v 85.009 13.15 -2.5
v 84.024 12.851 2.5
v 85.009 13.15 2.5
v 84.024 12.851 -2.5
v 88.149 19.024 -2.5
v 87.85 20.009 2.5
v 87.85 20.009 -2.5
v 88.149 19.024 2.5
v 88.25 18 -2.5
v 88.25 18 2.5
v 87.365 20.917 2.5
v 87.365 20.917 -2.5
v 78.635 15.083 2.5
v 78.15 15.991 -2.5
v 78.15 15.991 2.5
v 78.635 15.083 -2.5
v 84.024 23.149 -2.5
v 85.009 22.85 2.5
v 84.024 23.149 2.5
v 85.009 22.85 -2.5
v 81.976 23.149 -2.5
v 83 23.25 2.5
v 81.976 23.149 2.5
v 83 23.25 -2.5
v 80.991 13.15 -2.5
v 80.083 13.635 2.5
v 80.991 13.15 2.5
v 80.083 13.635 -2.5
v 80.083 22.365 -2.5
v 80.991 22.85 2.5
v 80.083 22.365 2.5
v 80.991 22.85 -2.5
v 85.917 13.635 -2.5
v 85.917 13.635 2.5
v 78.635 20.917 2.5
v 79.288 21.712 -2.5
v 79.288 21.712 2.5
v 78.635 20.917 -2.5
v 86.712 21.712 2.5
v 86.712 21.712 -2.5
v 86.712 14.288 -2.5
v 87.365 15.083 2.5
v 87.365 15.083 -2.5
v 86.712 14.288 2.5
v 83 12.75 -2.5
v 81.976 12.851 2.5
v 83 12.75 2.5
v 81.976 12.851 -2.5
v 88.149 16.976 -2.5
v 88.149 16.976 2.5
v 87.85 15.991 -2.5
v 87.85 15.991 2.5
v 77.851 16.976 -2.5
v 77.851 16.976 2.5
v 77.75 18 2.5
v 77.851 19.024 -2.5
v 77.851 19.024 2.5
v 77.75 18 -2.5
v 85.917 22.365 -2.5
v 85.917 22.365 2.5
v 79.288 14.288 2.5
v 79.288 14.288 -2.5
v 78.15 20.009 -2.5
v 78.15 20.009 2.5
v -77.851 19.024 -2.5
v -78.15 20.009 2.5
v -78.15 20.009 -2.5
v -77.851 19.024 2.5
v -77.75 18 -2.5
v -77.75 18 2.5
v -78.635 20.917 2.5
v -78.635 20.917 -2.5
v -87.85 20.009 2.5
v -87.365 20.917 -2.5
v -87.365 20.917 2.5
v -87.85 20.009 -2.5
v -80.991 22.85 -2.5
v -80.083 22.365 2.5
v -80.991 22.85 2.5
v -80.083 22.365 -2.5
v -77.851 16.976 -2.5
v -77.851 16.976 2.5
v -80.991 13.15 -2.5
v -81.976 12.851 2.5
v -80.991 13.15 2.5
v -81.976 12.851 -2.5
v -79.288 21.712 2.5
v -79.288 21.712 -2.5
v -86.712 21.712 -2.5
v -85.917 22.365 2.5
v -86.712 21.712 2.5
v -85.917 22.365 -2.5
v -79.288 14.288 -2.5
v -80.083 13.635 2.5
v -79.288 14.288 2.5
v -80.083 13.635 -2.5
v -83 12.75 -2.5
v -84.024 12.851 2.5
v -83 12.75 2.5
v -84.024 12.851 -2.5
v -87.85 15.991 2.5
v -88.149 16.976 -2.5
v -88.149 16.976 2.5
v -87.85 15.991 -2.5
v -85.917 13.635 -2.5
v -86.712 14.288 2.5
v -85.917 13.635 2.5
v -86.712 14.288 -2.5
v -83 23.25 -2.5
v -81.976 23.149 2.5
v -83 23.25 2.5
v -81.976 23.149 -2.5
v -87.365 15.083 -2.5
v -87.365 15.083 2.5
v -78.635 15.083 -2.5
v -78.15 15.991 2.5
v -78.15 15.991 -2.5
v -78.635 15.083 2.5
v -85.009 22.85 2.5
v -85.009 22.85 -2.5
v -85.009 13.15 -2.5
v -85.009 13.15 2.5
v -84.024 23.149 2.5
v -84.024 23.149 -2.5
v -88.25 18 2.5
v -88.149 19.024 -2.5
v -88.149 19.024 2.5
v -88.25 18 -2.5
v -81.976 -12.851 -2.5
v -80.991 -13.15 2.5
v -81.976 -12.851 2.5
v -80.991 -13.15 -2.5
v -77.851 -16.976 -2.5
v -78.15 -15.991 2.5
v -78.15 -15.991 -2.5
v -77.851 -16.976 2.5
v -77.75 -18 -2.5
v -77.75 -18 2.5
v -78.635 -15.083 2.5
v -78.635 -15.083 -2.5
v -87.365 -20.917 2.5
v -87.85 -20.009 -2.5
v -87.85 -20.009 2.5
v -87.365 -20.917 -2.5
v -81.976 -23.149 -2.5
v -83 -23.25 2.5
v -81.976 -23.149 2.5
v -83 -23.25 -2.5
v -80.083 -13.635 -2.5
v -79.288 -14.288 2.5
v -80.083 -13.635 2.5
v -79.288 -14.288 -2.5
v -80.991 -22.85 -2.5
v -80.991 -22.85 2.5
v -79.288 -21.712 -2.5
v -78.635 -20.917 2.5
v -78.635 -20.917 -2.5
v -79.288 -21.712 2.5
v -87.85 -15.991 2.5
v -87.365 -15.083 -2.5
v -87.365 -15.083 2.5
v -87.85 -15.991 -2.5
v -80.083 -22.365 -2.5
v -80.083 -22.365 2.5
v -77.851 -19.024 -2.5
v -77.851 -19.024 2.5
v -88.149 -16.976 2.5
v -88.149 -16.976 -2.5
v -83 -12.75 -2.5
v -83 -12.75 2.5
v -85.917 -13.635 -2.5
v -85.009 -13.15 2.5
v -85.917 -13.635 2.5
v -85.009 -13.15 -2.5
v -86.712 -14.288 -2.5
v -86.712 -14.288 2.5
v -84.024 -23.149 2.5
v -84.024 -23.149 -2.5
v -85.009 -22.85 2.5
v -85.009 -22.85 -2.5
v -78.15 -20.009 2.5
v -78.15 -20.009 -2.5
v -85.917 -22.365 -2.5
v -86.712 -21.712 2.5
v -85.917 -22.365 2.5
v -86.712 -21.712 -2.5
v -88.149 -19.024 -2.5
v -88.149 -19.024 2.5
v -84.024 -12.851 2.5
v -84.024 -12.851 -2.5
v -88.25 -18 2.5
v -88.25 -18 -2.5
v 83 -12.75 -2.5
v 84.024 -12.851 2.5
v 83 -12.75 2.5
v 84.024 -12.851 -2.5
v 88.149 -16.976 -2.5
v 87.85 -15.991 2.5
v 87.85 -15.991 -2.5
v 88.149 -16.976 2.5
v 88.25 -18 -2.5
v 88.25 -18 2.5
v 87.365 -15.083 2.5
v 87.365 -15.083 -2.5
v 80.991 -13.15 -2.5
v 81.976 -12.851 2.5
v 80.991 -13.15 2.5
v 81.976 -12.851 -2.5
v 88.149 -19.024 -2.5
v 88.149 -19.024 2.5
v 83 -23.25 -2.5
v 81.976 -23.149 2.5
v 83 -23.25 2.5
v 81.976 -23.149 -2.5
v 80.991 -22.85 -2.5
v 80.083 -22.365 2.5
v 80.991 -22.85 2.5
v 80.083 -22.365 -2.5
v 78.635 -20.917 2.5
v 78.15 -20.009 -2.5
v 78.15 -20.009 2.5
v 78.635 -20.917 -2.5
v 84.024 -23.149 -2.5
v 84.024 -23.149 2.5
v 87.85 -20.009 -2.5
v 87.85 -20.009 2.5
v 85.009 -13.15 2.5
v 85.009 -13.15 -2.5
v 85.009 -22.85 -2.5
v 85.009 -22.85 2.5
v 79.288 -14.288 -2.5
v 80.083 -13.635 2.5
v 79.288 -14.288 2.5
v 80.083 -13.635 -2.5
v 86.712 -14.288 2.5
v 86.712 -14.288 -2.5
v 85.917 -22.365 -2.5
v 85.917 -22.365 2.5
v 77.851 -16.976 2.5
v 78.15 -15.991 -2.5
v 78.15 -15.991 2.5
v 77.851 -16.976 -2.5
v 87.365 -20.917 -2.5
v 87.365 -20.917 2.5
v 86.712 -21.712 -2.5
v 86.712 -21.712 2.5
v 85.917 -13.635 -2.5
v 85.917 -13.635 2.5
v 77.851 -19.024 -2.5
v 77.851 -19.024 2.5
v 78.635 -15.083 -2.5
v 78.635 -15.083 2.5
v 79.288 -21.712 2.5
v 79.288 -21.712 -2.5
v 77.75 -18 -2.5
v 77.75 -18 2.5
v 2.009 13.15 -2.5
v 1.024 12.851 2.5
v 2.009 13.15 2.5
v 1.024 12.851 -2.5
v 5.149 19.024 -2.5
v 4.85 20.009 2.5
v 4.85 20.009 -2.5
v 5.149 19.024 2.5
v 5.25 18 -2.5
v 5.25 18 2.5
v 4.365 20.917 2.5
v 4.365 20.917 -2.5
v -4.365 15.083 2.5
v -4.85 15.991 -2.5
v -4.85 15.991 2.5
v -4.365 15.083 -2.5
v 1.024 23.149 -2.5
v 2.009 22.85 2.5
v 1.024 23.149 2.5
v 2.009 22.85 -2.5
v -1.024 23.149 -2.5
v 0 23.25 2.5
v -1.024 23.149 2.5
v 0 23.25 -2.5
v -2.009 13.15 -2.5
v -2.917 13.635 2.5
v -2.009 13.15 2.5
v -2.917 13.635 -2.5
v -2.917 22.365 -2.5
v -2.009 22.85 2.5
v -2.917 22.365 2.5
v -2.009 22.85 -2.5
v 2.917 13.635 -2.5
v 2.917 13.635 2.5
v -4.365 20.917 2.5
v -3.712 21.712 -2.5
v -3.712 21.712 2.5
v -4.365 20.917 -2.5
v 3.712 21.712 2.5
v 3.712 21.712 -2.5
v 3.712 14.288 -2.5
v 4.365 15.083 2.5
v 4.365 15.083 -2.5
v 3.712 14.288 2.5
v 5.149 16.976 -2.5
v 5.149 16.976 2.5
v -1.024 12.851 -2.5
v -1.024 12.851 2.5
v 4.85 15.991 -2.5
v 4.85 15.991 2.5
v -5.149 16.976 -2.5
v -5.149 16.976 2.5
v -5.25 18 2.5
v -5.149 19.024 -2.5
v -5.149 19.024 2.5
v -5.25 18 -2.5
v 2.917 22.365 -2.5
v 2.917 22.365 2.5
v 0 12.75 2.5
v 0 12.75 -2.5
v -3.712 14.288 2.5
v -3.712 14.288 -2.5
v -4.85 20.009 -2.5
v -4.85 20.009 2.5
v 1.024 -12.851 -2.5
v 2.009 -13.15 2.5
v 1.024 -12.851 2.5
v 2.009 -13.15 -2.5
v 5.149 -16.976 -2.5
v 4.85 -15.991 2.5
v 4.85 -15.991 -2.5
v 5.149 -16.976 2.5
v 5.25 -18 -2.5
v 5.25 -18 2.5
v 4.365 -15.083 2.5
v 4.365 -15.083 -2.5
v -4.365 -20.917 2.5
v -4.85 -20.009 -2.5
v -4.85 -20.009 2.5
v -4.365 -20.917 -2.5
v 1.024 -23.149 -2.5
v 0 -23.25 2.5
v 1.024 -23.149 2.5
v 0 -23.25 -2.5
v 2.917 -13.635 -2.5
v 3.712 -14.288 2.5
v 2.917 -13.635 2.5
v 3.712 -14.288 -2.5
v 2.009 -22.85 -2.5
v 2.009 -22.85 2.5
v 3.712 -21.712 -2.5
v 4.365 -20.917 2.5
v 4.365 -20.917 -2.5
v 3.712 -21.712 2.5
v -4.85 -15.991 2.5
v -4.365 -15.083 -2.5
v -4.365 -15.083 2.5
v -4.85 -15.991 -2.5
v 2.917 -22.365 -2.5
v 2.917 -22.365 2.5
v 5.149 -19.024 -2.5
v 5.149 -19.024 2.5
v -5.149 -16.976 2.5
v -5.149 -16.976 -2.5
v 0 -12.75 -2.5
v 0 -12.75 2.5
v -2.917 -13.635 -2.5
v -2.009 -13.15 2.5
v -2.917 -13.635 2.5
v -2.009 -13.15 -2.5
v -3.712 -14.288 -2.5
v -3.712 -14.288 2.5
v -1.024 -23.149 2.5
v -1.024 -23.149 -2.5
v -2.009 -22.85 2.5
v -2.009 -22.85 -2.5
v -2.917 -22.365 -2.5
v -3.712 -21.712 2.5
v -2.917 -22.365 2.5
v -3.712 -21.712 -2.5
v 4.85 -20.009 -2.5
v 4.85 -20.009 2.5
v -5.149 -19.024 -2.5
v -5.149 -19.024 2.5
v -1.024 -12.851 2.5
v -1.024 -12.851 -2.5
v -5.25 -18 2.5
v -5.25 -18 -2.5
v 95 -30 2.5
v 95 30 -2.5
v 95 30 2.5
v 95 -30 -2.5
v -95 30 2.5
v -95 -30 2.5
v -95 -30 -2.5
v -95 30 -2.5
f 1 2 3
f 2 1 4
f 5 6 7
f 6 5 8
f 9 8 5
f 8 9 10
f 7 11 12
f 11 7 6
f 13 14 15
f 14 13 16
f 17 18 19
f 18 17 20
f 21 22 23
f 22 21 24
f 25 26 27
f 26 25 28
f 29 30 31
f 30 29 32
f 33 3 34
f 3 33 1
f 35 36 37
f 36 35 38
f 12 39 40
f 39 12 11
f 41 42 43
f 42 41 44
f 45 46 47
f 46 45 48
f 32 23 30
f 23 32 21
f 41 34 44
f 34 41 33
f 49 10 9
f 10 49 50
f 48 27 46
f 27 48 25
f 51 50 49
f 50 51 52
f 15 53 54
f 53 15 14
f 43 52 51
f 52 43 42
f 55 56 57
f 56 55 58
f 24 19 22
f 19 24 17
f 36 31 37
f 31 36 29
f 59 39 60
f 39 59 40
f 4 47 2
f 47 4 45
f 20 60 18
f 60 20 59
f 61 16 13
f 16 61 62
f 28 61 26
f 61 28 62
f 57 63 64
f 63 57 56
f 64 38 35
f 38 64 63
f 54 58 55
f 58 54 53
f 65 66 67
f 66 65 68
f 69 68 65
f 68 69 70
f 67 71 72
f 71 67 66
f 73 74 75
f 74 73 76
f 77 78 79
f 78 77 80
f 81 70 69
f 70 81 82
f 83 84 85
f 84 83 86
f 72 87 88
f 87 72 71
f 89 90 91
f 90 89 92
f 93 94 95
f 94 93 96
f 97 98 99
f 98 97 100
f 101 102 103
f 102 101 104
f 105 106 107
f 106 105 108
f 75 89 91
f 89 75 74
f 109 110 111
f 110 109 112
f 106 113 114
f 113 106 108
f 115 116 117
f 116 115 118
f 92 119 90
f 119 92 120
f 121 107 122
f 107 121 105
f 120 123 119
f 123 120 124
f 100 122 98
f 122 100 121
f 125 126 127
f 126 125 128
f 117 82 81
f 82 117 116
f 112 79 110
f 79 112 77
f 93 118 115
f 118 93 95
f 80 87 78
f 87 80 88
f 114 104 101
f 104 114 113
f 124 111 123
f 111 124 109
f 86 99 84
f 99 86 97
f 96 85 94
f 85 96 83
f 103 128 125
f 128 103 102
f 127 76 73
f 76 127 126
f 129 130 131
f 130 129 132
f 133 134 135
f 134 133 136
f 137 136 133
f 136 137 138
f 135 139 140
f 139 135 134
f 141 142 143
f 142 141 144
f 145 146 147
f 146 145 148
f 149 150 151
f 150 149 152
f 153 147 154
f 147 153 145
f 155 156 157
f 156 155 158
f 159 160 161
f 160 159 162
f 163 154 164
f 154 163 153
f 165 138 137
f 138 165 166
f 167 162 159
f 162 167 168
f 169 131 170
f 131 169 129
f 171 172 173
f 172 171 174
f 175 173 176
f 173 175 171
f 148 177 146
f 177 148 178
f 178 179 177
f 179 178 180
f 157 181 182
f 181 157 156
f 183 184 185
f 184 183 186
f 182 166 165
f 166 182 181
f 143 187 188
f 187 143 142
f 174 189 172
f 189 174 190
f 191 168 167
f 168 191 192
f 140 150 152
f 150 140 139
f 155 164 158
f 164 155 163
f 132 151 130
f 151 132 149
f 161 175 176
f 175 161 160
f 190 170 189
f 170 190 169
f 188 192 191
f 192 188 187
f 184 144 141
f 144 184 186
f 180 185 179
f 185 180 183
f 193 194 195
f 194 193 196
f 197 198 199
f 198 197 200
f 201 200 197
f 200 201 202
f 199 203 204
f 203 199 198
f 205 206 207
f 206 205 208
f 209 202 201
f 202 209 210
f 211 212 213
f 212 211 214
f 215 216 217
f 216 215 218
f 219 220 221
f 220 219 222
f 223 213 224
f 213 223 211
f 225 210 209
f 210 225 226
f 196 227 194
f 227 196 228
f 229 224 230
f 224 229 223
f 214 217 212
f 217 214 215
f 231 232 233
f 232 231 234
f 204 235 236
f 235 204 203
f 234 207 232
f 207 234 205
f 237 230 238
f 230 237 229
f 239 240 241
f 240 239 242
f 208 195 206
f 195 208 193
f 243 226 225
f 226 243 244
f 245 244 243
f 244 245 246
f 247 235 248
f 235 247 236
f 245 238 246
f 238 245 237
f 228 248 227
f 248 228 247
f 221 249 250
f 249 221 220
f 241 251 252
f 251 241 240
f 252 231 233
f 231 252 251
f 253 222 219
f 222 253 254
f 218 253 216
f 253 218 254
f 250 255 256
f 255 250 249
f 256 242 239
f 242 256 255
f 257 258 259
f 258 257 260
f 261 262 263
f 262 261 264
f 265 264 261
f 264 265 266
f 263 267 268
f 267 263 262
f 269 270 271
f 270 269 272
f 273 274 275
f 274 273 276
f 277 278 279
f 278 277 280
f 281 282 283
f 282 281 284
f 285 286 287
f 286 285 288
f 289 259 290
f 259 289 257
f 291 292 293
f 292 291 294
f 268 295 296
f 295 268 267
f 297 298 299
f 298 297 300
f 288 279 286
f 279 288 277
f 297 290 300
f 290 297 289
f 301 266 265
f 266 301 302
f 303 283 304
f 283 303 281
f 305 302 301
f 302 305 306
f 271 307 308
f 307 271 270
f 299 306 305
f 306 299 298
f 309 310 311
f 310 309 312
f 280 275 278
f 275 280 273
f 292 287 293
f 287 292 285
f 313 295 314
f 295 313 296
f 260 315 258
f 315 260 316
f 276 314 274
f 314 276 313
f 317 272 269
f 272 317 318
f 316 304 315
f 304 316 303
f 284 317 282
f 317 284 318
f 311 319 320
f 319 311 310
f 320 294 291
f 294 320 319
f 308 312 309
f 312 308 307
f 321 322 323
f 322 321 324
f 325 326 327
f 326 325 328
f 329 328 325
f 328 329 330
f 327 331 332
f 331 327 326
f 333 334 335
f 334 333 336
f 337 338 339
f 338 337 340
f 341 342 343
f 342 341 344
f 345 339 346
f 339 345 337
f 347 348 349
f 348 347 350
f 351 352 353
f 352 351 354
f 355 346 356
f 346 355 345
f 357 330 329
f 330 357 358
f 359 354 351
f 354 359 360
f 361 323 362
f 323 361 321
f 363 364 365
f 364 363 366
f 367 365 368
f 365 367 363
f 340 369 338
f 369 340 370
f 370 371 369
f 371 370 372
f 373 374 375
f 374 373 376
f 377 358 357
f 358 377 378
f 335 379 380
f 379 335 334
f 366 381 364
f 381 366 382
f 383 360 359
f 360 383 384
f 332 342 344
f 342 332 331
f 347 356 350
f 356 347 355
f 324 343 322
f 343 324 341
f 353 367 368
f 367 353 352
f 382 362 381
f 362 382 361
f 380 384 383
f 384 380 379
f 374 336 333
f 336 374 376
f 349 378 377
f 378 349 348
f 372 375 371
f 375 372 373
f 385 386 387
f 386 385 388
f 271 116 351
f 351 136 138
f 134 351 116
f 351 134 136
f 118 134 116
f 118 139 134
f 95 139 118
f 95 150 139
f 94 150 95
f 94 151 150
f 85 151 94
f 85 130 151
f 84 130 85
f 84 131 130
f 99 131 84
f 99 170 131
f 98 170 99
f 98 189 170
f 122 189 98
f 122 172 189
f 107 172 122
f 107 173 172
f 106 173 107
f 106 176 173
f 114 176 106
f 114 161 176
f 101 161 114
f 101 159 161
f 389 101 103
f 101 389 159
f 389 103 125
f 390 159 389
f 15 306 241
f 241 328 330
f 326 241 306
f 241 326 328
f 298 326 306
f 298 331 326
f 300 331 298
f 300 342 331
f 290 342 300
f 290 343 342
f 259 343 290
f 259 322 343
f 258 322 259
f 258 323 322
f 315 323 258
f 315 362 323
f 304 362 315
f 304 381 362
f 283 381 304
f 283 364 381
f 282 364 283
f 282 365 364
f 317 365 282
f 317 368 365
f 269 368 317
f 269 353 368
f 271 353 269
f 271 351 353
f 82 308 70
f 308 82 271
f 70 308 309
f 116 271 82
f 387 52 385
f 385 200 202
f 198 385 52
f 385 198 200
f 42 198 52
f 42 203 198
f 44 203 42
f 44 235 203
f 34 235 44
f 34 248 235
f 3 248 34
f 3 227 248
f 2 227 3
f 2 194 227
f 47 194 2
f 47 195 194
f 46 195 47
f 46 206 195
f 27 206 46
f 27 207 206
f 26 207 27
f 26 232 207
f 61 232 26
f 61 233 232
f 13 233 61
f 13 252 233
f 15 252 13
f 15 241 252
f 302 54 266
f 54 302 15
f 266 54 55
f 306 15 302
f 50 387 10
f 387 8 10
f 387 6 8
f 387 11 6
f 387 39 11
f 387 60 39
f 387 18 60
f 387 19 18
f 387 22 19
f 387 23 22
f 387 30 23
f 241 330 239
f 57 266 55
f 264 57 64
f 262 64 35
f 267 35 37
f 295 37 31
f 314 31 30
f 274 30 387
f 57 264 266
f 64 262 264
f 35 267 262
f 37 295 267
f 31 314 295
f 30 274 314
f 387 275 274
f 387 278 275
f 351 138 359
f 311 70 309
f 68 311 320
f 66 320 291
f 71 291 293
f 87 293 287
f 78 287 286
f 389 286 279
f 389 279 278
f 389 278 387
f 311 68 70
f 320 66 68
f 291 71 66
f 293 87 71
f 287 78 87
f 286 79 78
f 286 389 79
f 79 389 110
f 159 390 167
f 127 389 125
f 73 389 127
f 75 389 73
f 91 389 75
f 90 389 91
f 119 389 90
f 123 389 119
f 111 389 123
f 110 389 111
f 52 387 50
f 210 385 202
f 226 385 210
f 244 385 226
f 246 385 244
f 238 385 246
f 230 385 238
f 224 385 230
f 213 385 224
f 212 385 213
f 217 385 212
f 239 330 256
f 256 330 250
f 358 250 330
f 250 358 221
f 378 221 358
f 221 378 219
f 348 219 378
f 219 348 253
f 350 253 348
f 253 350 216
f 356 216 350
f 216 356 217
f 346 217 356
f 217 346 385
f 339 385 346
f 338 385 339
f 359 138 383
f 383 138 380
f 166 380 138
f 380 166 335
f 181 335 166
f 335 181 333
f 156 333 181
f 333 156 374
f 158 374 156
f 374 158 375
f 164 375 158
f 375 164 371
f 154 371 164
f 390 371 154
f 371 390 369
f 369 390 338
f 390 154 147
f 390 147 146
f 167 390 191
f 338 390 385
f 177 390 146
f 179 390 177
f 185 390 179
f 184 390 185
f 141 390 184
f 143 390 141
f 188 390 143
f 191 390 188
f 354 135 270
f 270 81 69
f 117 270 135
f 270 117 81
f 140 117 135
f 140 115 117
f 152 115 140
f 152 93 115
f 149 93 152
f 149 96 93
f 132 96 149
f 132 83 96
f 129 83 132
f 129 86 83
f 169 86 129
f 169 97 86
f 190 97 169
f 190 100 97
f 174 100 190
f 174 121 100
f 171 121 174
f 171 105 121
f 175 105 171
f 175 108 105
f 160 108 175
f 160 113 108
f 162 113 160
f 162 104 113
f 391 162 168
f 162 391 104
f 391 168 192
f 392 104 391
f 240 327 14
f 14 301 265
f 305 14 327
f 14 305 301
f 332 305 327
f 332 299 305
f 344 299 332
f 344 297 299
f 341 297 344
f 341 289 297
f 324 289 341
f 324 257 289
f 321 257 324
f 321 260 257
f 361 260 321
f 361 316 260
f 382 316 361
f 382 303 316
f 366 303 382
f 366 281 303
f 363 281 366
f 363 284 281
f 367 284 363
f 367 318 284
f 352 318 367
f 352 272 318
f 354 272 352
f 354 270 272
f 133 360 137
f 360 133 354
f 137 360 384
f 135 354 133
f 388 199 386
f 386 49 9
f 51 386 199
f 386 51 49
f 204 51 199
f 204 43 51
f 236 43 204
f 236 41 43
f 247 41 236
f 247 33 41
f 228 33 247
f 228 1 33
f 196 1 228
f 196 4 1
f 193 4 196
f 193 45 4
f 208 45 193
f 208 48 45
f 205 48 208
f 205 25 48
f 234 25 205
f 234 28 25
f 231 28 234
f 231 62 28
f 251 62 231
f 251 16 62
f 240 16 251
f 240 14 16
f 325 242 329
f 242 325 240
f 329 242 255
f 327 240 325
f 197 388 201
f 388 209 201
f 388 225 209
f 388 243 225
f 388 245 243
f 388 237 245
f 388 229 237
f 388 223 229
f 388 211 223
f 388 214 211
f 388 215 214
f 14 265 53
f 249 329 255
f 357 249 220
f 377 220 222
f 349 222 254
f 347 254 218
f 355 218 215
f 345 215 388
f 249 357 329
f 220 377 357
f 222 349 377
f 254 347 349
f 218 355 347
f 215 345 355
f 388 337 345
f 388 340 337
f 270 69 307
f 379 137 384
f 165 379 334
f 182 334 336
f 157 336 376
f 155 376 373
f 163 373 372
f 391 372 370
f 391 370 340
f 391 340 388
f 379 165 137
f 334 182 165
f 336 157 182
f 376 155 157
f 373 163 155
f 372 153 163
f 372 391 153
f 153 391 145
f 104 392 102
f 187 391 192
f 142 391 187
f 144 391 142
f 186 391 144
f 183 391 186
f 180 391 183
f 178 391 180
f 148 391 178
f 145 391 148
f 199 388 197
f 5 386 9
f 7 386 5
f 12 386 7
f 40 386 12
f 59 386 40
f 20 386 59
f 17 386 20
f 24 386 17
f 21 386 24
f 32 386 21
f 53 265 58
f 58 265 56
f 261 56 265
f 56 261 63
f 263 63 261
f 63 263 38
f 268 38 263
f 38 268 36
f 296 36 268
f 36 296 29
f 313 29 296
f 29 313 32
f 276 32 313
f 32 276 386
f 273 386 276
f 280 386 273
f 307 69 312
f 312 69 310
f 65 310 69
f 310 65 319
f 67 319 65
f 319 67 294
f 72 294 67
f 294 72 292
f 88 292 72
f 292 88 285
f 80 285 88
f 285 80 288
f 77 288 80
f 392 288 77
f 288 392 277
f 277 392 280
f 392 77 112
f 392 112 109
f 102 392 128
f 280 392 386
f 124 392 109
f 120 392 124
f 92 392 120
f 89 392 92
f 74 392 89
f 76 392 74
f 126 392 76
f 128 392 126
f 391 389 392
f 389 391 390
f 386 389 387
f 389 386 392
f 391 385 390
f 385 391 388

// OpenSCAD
$fn = 32;

// ----------------------------------------------------------------------
// Corner plate 190 x 60 x 5
// 6 holes, centres taken from the edge offset
// ----------------------------------------------------------------------

// --- parameters (mm) ---
plate = [190, 60, 5];  // overall size (x, y, z)
holes = 6;             // number of holes the drawing asks for
hole_d = 10.5;         // hole diameter
edge = 12;             // hole centre offset from the plate edge

// --- derived feature positions (mm) ---
corner_x = plate[0] / 2 - edge;  // = 83   corner hole X
corner_y = plate[1] / 2 - edge;  // = 18   corner hole Y
feature_centers = [
  [corner_x, corner_y],
  [-corner_x, corner_y],
  [-corner_x, -corner_y],
  [corner_x, -corner_y],
  [0, corner_y],
  [0, -corner_y]
];   // hole centres the loop below drills

// plate outline, every hole drilled through with the same cutters
difference() {
  cube(plate, center = true);
  for (centre = feature_centers)
    translate([centre[0], centre[1], 0])
      cylinder(d = hole_d, h = plate[2] + 2, center = true);
}
